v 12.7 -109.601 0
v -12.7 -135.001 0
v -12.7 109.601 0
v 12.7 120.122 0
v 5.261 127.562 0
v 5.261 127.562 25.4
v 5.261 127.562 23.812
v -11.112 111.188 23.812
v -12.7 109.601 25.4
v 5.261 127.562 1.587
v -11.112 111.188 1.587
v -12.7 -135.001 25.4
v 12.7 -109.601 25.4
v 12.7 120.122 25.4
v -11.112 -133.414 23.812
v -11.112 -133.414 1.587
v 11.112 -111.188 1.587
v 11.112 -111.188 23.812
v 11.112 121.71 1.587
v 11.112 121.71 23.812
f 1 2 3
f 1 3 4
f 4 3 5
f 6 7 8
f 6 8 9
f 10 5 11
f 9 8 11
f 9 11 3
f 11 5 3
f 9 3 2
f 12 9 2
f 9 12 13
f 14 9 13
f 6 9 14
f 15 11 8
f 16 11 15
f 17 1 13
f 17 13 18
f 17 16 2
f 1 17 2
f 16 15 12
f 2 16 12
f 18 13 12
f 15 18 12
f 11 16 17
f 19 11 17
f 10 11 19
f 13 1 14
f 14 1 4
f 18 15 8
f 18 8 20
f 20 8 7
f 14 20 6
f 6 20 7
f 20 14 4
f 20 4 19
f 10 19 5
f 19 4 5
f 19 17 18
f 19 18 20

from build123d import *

# Parameters (mm, degrees)
F1_DEPTH = 25.4
F2_T     = -1.5875
F3_W     = 22.225
F3_H     = 22.225
F4_DEPTH = 262.563512
F6_DEPTH = 25.4


with BuildPart() as f1:
    # F0 (on Top) → F1 (new body)
    with BuildSketch(Plane.XY):
        Polygon((5.260512, 127.561512), (-12.7, 109.601), (-12.7, -135.001), (12.7, -135.001), (12.7, 120.122024), align=None)
    extrude(amount=F1_DEPTH)

    # F2
    f2_openings = [f1.faces().sort_by_distance(p)[0] for p in [
        (0, -135.001, 12.7),
    ]]
    offset(amount=F2_T, openings=f2_openings)

    # F3 (on face) → F4 (cut, through all)
    with BuildSketch(Plane.XZ.offset(135.001)):
        with Locations((0, 12.7)):
            Rectangle(F3_W, F3_H)
    extrude(amount=-F4_DEPTH, mode=Mode.SUBTRACT)

    # F5 (on face) → F6 (cut)
    with BuildSketch(Plane.XY.offset(25.4)):
        Polygon((12.7, -109.601), (-12.7, -135.001), (12.7, -135.001), align=None)
    extrude(amount=-F6_DEPTH, mode=Mode.SUBTRACT)


solid = f1.part
